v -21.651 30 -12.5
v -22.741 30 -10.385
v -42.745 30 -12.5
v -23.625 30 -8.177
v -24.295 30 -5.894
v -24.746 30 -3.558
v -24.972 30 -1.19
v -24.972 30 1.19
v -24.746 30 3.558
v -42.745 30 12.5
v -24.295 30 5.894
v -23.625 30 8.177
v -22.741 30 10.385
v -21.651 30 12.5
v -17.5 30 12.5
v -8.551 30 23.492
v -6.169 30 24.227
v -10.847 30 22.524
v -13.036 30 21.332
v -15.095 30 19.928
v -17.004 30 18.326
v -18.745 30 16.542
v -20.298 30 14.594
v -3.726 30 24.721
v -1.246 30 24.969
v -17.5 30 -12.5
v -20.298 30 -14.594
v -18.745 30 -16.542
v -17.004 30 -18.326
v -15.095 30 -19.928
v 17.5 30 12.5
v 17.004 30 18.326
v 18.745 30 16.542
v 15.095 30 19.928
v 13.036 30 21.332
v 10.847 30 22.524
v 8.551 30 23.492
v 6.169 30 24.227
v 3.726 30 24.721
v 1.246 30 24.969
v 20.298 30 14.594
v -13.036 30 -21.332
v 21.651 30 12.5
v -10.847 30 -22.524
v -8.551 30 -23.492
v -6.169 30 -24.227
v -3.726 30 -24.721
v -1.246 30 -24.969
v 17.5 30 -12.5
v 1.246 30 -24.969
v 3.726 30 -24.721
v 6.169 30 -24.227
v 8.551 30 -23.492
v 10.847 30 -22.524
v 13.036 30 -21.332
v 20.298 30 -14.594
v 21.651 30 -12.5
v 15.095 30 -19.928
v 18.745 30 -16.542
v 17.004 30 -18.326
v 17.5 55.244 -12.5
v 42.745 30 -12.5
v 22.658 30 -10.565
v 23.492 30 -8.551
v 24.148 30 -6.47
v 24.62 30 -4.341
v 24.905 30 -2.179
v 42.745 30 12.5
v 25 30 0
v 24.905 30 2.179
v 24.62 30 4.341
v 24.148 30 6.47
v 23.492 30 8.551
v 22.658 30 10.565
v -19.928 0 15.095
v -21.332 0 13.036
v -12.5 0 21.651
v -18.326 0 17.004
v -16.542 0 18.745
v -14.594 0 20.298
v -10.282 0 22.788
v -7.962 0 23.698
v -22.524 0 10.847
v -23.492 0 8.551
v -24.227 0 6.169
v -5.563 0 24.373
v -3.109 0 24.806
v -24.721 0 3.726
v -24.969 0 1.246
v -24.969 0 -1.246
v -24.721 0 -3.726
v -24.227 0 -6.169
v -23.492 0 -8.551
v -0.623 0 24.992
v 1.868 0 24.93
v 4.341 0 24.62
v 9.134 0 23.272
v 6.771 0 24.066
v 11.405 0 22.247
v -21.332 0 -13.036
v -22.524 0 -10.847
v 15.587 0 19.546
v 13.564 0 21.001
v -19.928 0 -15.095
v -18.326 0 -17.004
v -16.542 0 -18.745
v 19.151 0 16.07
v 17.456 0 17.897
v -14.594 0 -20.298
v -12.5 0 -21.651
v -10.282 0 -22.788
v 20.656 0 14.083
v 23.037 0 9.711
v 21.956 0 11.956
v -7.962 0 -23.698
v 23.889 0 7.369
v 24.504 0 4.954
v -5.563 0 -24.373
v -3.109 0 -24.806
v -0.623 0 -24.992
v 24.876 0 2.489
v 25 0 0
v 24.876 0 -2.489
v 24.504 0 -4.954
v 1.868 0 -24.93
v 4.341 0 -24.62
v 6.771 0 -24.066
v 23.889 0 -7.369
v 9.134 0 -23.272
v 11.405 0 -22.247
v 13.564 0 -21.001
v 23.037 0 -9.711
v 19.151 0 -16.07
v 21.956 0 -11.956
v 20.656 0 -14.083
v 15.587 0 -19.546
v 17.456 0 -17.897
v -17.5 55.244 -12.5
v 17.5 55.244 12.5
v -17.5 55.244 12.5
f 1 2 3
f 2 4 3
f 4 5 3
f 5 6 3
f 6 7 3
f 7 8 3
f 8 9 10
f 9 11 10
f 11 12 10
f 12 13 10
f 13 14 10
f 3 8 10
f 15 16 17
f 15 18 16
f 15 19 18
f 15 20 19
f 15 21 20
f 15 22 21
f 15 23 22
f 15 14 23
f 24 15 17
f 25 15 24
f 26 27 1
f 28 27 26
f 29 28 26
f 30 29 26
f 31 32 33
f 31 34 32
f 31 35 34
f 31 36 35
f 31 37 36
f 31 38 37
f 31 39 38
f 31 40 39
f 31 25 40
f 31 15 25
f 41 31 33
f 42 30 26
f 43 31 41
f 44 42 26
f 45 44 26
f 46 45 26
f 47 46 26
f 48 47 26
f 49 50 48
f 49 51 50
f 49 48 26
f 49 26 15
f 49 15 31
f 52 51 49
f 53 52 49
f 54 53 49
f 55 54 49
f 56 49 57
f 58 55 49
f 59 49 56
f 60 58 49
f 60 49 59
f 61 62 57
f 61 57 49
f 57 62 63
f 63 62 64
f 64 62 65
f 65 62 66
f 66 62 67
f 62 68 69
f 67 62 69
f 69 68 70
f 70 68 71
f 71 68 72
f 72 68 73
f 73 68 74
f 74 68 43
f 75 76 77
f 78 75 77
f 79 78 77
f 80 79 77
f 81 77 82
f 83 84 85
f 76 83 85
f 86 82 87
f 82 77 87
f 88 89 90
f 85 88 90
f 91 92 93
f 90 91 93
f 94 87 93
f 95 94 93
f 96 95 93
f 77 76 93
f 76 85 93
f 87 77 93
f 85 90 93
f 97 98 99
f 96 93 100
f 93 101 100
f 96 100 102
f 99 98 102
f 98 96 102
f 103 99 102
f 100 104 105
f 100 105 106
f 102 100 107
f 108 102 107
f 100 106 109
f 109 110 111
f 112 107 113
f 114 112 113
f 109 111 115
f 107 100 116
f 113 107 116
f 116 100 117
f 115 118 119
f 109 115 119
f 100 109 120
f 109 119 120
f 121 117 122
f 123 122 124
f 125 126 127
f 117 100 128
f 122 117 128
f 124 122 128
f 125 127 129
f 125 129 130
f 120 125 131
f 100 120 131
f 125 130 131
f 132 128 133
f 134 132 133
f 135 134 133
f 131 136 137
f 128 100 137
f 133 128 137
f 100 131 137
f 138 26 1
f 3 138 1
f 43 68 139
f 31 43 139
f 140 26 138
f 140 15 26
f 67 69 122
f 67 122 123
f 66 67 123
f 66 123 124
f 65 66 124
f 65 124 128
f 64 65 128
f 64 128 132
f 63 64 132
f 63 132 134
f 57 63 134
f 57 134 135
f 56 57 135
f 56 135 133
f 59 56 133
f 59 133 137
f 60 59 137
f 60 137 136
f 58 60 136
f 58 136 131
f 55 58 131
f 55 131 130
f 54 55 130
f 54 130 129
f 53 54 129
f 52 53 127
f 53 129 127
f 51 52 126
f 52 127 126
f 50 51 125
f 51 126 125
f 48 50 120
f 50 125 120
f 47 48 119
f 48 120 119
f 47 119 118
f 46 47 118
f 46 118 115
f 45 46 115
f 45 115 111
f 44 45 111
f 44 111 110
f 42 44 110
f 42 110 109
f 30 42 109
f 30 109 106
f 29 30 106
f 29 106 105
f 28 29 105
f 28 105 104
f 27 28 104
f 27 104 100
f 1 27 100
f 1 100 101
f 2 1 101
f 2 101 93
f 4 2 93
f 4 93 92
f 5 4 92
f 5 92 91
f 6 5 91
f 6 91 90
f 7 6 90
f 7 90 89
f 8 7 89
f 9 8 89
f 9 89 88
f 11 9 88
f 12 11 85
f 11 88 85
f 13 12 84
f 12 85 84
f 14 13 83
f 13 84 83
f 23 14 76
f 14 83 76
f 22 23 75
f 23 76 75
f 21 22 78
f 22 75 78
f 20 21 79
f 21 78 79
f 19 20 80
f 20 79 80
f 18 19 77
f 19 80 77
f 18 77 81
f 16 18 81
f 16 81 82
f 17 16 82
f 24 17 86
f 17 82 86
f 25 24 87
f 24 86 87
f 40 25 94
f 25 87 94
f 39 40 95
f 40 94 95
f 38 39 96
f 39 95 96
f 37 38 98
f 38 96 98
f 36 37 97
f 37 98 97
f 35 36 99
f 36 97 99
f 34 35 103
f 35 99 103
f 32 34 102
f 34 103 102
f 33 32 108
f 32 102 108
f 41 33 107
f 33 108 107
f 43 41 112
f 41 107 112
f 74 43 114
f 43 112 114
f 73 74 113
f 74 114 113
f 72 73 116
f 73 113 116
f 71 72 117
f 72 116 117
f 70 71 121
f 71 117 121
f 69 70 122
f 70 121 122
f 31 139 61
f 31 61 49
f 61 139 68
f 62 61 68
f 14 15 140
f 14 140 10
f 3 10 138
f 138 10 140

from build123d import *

# Parameters (mm, degrees)
SKETCH_1_R          = 25
EXTRUDE_1_DEPTH     = 30
EXTRUDE_2_DEPTH     = 12.5
CUT_EXTRUDE_1_DEPTH = 19


with BuildPart() as part:
    # 草图1 → 凸台-拉伸1 (new body)
    with BuildSketch(Plane(origin=(0, 0, 0), x_dir=(1, 0, 0), z_dir=(0, 1, 0))):
        Circle(SKETCH_1_R)
    extrude(amount=EXTRUDE_1_DEPTH)

    # 草图3 → 凸台-拉伸2 (add, symmetric)
    with BuildSketch(Plane.XY):
        Polygon((42.744510846, 30), (-42.744510846, 30), (0, 72.744510846), align=None)
    extrude(amount=EXTRUDE_2_DEPTH, both=True)

    # 草图4 → 切除-拉伸1 (cut, symmetric)
    with BuildSketch(Plane.XY):
        Polygon((17.500255974, 30), (-17.500255974, 30), (-17.500255974, 55.244254872), (0, 72.744510846), (17.500255974, 55.244254872), align=None)
    extrude(amount=CUT_EXTRUDE_1_DEPTH, both=True, mode=Mode.SUBTRACT)


solid = part.part
